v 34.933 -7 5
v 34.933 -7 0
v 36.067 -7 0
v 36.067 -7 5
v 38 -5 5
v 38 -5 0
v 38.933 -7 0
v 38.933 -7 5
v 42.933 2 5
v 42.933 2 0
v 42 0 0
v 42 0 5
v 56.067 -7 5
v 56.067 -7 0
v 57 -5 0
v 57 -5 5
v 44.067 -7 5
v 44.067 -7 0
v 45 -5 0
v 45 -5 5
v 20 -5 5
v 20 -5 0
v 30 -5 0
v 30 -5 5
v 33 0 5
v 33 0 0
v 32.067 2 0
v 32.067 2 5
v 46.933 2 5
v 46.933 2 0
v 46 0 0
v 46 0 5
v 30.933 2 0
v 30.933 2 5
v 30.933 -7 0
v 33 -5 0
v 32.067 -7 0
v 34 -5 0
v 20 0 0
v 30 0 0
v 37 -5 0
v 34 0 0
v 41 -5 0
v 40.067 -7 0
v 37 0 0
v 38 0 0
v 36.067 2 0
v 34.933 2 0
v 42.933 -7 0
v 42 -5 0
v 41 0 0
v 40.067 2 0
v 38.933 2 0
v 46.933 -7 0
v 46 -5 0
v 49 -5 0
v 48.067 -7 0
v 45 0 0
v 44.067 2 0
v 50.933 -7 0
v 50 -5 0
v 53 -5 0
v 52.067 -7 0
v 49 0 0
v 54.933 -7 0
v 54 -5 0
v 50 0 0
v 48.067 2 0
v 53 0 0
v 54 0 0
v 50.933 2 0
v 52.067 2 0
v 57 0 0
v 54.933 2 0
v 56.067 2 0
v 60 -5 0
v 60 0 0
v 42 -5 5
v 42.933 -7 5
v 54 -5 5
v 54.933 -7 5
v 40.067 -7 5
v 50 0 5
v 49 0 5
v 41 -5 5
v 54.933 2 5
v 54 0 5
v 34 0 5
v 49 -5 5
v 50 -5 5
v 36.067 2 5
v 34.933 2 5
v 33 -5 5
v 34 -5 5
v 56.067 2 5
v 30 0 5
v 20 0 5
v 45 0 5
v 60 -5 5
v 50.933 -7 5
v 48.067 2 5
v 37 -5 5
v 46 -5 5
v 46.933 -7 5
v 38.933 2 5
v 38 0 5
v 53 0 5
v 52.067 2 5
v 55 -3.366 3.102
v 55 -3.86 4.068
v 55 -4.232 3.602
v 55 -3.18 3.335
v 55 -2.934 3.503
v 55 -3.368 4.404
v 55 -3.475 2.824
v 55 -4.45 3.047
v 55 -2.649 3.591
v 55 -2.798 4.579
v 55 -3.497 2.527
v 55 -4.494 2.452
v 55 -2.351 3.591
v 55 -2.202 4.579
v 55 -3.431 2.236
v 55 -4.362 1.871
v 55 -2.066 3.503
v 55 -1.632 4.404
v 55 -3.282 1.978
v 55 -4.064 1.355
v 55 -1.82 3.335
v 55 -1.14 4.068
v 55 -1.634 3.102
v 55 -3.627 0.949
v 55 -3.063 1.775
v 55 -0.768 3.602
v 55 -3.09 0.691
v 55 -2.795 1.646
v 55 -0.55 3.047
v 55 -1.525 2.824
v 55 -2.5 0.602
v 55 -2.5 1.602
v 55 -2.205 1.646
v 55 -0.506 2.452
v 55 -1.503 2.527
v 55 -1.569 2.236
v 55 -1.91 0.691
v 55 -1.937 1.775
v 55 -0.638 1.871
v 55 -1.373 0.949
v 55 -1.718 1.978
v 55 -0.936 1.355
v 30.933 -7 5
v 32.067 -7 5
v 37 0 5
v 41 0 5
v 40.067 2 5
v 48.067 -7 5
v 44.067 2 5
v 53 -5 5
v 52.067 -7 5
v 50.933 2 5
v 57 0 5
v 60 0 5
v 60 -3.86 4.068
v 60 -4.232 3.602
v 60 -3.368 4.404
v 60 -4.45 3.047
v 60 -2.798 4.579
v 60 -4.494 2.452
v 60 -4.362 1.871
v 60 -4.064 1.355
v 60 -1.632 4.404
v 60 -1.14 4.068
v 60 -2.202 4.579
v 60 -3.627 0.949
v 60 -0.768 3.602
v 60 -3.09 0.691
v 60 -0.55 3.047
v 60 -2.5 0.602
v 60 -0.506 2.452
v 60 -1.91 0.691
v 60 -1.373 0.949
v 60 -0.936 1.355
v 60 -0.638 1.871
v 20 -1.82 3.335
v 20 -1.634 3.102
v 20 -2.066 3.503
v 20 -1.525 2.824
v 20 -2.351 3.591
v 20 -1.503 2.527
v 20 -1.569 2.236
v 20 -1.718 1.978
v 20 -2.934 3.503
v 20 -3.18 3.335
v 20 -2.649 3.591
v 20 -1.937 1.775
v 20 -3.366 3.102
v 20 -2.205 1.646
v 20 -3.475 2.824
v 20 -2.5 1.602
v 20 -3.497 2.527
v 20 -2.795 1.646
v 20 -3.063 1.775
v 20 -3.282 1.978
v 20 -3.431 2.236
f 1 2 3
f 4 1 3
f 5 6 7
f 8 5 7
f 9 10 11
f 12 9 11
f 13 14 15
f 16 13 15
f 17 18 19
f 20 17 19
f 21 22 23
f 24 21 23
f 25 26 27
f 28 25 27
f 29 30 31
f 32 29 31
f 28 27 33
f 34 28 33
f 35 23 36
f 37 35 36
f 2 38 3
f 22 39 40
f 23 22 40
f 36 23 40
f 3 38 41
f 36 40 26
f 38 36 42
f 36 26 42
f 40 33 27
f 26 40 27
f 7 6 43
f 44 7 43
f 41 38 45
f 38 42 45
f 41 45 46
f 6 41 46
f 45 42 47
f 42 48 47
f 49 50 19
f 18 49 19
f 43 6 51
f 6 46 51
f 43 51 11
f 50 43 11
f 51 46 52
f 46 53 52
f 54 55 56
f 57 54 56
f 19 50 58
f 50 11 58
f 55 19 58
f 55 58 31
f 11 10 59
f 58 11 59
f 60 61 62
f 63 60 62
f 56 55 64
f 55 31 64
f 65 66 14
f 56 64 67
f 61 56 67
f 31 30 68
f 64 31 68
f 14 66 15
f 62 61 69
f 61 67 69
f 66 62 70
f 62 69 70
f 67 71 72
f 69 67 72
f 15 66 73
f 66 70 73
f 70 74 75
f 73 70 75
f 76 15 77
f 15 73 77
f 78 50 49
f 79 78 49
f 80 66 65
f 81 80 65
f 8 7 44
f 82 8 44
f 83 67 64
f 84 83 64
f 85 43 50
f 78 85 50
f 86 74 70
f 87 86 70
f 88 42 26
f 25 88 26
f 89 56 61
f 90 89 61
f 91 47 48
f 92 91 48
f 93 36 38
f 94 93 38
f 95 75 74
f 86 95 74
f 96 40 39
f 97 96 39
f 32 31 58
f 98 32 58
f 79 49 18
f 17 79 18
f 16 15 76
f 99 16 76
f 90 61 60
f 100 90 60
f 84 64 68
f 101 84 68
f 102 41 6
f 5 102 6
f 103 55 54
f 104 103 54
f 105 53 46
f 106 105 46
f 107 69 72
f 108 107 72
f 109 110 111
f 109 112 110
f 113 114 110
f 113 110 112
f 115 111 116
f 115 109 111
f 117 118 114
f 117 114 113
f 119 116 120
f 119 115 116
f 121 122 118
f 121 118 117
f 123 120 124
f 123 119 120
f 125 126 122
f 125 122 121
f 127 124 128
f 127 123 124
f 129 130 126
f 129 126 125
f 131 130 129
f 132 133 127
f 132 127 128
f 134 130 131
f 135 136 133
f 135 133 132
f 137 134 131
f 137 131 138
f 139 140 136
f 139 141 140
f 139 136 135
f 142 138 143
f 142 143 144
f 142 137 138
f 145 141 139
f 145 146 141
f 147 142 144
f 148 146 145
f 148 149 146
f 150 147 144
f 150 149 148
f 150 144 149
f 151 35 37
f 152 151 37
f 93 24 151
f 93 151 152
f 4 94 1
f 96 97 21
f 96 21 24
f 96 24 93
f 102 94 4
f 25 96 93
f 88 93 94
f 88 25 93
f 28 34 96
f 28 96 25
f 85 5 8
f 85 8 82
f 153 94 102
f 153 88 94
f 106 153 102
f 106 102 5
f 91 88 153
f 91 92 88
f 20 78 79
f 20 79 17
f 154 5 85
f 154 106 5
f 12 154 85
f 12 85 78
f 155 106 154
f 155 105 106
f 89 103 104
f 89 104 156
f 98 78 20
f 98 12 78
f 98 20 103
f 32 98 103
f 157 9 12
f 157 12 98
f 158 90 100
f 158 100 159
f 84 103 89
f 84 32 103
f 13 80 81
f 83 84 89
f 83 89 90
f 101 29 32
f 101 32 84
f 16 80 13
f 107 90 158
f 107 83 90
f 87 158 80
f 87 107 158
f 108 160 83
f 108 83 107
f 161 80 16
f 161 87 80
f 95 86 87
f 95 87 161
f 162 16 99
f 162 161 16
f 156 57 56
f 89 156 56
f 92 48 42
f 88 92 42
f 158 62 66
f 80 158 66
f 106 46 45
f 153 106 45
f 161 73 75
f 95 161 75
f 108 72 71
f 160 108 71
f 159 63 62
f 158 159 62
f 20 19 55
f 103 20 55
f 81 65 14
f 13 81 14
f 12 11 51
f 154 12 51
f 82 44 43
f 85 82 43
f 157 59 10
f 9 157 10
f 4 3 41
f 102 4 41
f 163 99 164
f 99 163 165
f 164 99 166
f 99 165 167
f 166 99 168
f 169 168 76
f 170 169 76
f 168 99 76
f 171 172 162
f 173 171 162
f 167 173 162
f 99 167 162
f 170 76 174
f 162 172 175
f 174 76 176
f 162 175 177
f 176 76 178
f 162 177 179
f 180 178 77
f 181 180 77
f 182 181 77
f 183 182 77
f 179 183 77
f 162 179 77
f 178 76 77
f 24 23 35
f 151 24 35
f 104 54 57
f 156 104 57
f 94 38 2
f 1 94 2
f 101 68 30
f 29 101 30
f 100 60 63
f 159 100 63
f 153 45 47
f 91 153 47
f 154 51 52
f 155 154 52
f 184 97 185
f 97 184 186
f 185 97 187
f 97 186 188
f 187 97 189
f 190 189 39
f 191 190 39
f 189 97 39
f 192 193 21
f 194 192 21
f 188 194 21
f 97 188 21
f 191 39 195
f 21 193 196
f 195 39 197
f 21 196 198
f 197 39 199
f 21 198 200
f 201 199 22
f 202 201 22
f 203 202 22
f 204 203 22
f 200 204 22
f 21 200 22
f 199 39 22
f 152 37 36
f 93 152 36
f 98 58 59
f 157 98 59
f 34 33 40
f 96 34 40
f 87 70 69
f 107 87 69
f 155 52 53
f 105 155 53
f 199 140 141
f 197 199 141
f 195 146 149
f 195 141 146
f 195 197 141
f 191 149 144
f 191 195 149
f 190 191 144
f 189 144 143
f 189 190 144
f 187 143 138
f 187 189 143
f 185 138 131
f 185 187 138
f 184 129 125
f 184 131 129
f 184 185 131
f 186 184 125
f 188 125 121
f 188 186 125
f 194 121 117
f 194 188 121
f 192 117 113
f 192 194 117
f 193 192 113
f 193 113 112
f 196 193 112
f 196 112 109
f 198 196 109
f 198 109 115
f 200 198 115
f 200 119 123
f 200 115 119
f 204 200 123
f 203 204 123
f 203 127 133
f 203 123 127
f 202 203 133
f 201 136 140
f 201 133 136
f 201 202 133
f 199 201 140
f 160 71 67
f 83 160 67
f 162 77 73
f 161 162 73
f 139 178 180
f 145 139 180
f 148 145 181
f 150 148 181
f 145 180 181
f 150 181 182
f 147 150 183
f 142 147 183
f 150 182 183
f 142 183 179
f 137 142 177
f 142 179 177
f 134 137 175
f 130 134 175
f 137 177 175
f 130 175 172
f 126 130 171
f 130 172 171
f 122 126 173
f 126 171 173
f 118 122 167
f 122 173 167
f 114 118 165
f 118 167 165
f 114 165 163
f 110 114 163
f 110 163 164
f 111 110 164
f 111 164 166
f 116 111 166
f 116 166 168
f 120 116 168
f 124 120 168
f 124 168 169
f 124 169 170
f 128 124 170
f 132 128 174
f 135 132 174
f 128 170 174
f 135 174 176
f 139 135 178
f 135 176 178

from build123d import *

# Parameters (mm, degrees)
BOSS_EXTRUDE1_DEPTH = 5
SKETCH3_R           = 2
CUT_EXTRUDE1_DEPTH  = 5
SKETCH4_R           = 1
CUT_EXTRUDE9_DEPTH  = 61


with BuildPart() as part:
    # Sketch1 → Boss-Extrude1 (new body)
    with BuildSketch(Plane.XY):
        Polygon((53, -5), (54, -5), (54.932615316, -7), (56.067384684, -7), (57, -5), (60, -5), (60, 0), (57, 0), (56.067384684, 2), (54.932615316, 2), (54, 0), (53, 0), (52.067384684, 2), (50.932615316, 2), (50, 0), (49, 0), (48.067384684, 2), (46.932615316, 2), (46, 0), (45, 0), (44.067384684, 2), (42.932615316, 2), (42, 0), (41, 0), (40.067384684, 2), (38.932615316, 2), (38, 0), (37, 0), (36.067384684, 2), (34.932615316, 2), (34, 0), (33, 0), (32.067384684, 2), (30.932615316, 2), (30, 0), (20, 0), (20, -5), (30, -5), (30.932615316, -7), (32.067384684, -7), (33, -5), (34, -5), (34.932615316, -7), (36.067384684, -7), (37, -5), (38, -5), (38.932615316, -7), (40.067384684, -7), (41, -5), (42, -5), (42.932615316, -7), (44.067384684, -7), (45, -5), (46, -5), (46.932615316, -7), (48.067384684, -7), (49, -5), (50, -5), (50.932615316, -7), (52.067384684, -7), align=None)
    extrude(amount=BOSS_EXTRUDE1_DEPTH)

    # Sketch3 → Cut-Extrude1 (cut)
    with BuildSketch(Plane(origin=(60, 0, 0), x_dir=(0, 0, -1), z_dir=(1, 0, 0))):
        with Locations((-2.601693616, -2.5)):
            Circle(SKETCH3_R)
    extrude(amount=-CUT_EXTRUDE1_DEPTH, mode=Mode.SUBTRACT)

    # Sketch4 → Cut-Extrude9 (cut, through all)
    with BuildSketch(Plane(origin=(0, 0, 0), x_dir=(0, 0, -1), z_dir=(1, 0, 0))):
        with Locations((-2.601693616, -2.5)):
            Circle(SKETCH4_R)
    extrude(amount=CUT_EXTRUDE9_DEPTH, mode=Mode.SUBTRACT)


solid = part.part
